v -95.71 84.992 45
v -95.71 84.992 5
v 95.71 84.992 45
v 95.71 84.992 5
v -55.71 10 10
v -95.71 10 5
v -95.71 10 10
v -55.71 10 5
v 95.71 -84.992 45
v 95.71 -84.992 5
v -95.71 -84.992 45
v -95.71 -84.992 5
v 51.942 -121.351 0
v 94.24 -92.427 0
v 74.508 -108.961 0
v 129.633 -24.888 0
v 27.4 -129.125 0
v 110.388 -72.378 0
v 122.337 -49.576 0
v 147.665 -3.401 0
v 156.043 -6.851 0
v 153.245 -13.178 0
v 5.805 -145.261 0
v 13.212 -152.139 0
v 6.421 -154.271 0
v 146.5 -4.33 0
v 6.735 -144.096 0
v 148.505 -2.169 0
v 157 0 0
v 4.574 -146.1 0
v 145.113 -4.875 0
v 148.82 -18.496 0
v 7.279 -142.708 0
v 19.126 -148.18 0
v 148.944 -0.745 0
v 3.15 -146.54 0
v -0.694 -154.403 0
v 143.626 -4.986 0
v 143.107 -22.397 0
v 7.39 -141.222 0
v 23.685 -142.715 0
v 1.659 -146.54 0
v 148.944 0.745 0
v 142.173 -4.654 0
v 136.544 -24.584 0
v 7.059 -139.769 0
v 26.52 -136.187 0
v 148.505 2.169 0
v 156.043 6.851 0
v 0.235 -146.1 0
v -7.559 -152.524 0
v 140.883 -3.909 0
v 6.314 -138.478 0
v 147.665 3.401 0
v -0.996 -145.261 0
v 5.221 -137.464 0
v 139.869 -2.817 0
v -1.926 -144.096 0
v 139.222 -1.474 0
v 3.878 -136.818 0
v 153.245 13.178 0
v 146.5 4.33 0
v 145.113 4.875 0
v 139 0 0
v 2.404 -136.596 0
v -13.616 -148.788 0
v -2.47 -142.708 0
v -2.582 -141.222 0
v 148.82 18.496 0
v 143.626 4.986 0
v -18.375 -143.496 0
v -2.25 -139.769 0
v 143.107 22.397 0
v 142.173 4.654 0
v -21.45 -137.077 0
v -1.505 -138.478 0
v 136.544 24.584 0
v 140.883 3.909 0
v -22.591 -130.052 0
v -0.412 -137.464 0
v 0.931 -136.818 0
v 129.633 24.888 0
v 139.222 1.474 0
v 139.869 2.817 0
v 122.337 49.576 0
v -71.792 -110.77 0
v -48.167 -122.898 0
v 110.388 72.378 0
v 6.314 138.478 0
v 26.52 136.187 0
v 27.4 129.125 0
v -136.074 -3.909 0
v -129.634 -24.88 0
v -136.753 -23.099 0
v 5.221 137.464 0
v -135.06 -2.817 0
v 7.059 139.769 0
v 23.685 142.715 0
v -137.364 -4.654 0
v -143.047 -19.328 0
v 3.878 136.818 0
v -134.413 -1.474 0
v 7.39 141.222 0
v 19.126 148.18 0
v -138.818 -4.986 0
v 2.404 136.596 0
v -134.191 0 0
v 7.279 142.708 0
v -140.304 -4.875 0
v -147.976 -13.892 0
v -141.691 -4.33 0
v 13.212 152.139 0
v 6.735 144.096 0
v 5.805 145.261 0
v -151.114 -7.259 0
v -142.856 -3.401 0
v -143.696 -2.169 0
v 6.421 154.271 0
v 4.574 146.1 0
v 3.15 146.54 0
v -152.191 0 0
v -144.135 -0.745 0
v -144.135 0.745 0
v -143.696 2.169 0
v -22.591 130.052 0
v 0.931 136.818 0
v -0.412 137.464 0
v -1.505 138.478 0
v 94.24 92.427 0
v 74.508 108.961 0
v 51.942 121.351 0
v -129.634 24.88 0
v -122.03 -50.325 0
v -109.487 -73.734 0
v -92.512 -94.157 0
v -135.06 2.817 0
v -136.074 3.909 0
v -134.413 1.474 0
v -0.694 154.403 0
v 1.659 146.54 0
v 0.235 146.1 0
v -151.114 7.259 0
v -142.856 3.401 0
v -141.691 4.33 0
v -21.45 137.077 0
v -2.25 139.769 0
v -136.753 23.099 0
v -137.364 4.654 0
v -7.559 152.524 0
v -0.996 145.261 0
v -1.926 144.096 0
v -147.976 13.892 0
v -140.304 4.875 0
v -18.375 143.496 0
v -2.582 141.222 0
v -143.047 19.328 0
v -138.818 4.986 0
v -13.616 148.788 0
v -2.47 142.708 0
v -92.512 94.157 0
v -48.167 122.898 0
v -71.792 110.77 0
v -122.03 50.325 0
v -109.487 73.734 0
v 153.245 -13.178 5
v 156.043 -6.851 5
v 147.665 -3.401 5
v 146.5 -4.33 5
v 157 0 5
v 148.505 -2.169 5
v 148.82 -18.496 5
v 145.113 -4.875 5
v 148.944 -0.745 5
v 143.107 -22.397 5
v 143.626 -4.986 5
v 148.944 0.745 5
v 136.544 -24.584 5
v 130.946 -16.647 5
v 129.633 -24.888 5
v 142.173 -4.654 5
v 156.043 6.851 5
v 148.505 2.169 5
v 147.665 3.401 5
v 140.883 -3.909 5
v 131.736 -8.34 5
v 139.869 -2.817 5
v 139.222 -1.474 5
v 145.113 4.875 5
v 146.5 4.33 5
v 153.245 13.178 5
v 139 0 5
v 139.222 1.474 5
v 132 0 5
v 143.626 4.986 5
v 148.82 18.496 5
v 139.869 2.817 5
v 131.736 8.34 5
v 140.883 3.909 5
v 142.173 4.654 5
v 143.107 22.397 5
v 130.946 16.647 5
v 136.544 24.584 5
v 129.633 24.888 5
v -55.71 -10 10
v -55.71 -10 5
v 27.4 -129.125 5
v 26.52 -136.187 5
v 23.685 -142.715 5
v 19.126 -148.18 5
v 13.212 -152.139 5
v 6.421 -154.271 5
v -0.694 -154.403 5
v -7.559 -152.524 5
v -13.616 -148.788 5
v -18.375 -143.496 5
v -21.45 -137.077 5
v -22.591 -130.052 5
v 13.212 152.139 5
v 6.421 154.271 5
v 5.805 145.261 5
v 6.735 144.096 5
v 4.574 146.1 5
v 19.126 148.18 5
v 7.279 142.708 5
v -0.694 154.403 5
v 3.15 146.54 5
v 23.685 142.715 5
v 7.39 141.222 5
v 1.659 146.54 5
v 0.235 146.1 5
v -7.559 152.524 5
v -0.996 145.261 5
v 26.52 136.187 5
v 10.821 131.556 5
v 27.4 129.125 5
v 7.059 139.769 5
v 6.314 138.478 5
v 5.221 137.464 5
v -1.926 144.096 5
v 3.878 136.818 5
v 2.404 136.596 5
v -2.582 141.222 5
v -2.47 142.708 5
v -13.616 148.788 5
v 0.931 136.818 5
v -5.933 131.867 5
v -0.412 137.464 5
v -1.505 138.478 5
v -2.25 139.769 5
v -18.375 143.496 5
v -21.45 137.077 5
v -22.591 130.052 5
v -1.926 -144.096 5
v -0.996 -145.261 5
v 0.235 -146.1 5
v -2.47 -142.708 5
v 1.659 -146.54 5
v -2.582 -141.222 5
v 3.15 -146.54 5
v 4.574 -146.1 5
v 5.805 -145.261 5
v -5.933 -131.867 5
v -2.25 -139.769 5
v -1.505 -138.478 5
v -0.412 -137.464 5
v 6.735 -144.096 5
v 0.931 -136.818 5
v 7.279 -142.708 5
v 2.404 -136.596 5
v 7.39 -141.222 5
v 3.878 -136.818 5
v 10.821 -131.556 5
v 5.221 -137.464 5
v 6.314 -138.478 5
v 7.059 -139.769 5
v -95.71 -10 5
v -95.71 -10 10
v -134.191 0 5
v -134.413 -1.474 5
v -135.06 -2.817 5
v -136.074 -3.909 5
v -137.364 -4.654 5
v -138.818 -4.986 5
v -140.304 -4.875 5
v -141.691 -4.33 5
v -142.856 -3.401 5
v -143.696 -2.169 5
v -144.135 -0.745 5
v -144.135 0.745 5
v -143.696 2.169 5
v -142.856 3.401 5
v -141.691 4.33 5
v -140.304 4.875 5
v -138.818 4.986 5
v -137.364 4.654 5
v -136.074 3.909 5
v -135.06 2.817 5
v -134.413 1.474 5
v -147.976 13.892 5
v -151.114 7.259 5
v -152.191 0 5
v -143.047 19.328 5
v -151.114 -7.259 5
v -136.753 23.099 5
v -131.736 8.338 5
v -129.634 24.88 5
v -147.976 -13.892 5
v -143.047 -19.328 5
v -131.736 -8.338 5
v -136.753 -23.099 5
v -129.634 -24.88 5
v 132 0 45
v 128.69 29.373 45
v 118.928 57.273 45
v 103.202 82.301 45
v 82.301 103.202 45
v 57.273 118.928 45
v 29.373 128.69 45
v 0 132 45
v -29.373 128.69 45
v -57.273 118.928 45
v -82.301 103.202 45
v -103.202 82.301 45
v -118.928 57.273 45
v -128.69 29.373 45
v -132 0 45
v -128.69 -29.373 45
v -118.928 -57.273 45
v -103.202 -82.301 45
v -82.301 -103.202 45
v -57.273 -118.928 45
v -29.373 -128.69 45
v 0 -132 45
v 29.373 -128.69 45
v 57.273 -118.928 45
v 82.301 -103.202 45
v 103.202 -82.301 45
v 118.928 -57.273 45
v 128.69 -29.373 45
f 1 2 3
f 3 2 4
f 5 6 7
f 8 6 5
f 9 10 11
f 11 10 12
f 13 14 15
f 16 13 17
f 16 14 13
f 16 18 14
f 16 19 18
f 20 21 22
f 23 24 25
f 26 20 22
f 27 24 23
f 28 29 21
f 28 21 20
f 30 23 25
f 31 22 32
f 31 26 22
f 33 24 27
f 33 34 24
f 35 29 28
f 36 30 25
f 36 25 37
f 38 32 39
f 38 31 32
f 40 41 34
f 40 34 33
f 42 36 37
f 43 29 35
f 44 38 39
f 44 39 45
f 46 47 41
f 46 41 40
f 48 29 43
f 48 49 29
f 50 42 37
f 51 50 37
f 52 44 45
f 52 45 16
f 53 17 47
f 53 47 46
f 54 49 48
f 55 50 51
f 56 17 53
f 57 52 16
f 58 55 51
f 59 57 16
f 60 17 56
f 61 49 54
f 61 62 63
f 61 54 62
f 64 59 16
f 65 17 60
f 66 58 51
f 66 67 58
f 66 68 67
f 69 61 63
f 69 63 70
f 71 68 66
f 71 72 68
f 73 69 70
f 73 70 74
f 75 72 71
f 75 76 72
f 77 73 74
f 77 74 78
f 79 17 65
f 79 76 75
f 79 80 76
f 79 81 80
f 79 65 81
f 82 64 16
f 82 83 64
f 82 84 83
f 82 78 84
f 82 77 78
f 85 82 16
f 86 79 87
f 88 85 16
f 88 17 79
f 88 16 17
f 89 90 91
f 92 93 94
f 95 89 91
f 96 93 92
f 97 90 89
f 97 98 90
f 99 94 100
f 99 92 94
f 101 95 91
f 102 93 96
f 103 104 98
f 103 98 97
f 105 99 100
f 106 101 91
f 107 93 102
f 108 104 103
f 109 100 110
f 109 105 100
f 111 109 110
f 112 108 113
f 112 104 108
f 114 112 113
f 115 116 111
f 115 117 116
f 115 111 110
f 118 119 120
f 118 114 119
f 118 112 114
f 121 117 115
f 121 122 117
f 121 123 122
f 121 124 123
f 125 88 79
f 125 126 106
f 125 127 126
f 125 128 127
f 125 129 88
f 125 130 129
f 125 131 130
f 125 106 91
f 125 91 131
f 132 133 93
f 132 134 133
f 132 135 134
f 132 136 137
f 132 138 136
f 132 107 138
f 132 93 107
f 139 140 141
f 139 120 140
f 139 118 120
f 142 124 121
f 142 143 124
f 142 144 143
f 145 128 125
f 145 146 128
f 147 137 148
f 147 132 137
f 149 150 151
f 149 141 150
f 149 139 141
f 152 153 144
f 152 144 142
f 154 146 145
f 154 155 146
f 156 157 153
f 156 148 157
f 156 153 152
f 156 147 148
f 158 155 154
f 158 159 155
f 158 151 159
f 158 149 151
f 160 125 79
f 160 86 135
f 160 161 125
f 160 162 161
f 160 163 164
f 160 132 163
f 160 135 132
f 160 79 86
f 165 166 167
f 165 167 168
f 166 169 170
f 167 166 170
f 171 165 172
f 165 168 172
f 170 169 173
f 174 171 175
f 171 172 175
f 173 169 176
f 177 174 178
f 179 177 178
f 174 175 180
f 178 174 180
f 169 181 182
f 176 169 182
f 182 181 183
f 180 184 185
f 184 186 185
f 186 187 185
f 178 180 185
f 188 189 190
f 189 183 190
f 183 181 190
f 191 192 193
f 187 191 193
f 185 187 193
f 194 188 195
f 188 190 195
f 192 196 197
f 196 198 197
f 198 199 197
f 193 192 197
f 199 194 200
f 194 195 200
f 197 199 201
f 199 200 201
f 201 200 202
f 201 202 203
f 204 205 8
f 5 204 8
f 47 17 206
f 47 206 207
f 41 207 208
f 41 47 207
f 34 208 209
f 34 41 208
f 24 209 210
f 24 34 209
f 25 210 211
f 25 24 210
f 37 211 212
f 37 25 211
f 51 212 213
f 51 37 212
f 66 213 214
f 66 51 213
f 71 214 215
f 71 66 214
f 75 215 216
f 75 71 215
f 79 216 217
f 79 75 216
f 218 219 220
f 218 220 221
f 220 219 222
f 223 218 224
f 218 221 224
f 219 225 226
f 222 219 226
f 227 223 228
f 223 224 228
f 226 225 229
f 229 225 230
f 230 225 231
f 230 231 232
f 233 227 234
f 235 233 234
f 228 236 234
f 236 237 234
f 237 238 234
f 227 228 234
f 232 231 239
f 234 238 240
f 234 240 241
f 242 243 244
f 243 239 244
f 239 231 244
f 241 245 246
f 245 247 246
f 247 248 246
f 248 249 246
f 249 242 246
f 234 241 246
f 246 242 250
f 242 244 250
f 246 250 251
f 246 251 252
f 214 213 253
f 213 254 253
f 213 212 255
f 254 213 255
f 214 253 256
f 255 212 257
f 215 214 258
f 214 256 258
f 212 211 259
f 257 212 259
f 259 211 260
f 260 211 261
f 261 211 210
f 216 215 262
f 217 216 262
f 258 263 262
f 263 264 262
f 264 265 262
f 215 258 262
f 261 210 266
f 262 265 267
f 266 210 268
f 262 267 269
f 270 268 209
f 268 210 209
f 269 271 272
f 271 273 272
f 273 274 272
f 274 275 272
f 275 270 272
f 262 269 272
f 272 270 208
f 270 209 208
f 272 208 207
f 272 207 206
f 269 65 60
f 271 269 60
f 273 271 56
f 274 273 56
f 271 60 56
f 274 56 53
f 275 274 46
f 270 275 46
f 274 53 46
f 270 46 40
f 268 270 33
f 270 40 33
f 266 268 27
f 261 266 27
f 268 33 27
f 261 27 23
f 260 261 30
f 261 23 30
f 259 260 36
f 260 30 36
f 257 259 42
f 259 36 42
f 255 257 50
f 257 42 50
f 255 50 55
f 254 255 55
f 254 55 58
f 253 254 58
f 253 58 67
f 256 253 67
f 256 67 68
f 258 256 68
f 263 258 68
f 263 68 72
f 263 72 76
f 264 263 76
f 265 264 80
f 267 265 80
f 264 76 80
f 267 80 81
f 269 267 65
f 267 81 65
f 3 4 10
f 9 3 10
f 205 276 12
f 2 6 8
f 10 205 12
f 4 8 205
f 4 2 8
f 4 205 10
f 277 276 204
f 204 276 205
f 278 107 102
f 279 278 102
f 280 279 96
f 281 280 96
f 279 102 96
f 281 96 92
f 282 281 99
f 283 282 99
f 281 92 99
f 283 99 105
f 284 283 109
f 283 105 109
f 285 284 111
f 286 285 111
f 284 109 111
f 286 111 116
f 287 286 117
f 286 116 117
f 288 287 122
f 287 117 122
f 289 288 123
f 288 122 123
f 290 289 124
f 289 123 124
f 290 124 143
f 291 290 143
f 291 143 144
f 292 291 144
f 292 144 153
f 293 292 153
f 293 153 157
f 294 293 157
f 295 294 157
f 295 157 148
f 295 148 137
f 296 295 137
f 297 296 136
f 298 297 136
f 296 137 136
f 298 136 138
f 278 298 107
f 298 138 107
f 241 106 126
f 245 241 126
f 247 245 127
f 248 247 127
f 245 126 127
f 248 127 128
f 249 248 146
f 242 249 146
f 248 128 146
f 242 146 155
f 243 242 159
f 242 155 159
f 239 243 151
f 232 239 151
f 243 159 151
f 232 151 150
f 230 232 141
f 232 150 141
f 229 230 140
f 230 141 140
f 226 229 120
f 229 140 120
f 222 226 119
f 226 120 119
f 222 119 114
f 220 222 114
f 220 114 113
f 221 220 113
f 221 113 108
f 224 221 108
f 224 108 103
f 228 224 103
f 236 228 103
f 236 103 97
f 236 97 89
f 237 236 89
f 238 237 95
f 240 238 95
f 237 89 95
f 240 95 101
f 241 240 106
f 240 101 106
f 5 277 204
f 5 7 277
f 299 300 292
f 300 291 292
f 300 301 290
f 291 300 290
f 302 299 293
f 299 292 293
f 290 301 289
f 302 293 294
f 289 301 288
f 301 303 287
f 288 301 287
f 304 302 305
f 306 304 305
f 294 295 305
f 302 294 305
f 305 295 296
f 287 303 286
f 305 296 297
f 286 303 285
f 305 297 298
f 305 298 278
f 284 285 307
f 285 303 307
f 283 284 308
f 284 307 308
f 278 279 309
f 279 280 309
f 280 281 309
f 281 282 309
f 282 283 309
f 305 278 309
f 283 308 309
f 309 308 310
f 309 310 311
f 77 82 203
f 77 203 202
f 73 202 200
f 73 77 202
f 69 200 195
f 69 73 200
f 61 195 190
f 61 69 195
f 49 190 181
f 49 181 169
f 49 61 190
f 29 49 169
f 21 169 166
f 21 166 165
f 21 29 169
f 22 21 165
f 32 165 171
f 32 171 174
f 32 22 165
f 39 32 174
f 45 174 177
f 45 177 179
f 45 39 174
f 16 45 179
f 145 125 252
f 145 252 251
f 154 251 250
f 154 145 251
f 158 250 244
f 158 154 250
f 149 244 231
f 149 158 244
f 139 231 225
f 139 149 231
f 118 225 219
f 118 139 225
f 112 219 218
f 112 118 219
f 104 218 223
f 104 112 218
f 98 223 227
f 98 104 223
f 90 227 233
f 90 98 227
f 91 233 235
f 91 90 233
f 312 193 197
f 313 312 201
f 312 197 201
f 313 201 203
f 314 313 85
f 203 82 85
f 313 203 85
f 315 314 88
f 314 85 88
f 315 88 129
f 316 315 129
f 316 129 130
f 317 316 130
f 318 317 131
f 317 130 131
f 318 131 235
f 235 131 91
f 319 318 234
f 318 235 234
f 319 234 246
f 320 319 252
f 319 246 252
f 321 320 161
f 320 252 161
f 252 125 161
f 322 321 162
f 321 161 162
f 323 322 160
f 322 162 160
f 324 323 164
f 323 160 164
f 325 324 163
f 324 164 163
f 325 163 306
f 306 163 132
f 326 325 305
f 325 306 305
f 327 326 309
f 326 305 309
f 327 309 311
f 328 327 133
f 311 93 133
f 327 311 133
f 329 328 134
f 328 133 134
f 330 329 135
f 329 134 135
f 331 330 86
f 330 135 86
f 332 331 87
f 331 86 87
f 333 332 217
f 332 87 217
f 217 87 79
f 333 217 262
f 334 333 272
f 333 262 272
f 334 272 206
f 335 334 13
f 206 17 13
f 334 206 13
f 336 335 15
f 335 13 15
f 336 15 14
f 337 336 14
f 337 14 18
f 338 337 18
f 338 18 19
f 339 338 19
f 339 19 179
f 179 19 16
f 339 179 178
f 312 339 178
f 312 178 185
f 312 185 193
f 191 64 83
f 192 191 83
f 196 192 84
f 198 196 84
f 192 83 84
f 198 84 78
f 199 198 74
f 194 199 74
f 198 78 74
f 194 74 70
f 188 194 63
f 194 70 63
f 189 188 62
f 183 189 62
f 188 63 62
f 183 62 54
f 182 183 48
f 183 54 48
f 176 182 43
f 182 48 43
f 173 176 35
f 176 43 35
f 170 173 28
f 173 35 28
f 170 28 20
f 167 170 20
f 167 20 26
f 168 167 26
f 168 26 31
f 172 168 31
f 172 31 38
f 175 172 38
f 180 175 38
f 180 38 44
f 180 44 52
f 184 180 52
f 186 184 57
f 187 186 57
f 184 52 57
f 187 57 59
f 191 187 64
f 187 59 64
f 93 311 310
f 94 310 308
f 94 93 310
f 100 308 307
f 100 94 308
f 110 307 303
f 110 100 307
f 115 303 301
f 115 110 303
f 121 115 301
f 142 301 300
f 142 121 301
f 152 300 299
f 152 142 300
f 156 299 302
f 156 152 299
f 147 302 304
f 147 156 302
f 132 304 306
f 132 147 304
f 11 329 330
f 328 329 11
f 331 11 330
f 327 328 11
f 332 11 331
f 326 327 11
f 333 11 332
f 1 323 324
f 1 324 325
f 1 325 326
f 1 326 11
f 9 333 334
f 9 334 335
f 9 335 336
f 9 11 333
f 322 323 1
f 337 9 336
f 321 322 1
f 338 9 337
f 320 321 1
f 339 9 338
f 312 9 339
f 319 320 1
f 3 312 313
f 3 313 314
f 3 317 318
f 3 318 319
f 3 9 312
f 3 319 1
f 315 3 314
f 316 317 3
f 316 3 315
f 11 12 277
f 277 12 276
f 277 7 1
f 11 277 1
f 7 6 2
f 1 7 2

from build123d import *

# Parameters (mm, degrees)
SKETCH1_R           = 132
BOSS_EXTRUDE1_DEPTH = 5
SKETCH2_R           = 132
SKETCH2_R_2         = 128
BOSS_EXTRUDE2_DEPTH = 40
BOSS_EXTRUDE3_DEPTH = 40
SKETCH6_W           = 40
SKETCH6_H           = 20
BOSS_EXTRUDE5_DEPTH = 5
SKETCH7_W           = 40
SKETCH7_H           = 20
CUT_EXTRUDE1_DEPTH  = 5
SKETCH8_W           = 40
SKETCH8_H           = 10
BOSS_EXTRUDE7_DEPTH = 5
SKETCH9_R           = 5
BOSS_EXTRUDE8_DEPTH = 5
CIRPATTERN1_COUNT   = 4


with BuildPart() as part:
    # Sketch1 → Boss-Extrude1 (new body)
    with BuildSketch(Plane.XY):
        Circle(SKETCH1_R)
    extrude(amount=BOSS_EXTRUDE1_DEPTH)

    # Sketch2 → Boss-Extrude2 (add)
    with BuildSketch(Plane.XY.offset(5)):
        Circle(SKETCH2_R)
        Circle(SKETCH2_R_2, mode=Mode.SUBTRACT)
    extrude(amount=BOSS_EXTRUDE2_DEPTH)

    # Sketch3 → Boss-Extrude3 (add)
    with BuildSketch(Plane.XY.offset(5)):
        with BuildLine():
            ThreePointArc((95.710026061, 84.99171084), (0, 128), (-95.710026061, 84.99171084))
            Line((-95.710026061, 84.99171084), (95.710026061, 84.99171084))
        make_face()
        with BuildLine():
            Line((95.710026061, 84.99171084), (95.710026061, -84.99171084))
            ThreePointArc((95.710026061, -84.99171084), (119.655512484, -45.45941412), (128, 0))
            ThreePointArc((128, 0), (119.655512484, 45.45941412), (95.710026061, 84.99171084))
        make_face()
        with BuildLine():
            Line((95.710026061, -84.99171084), (-95.710026061, -84.99171084))
            ThreePointArc((-95.710026061, -84.99171084), (0, -128), (95.710026061, -84.99171084))
        make_face()
        with BuildLine():
            ThreePointArc((-95.710026061, 84.99171084), (-128, 0), (-95.710026061, -84.99171084))
            Line((-95.710026061, -84.99171084), (-95.710026061, 84.99171084))
        make_face()
    extrude(amount=BOSS_EXTRUDE3_DEPTH)

    # Sketch6 → Boss-Extrude5 (add)
    with BuildSketch(Plane.XY.offset(5)):
        with Locations((-50, 0)):
            Rectangle(SKETCH6_W, SKETCH6_H)
    extrude(amount=BOSS_EXTRUDE5_DEPTH)

    # Sketch7 → Cut-Extrude1 (cut)
    with BuildSketch(Plane.XY.offset(10)):
        with Locations((-50, 0)):
            Rectangle(SKETCH7_W, SKETCH7_H)
    extrude(amount=-CUT_EXTRUDE1_DEPTH, mode=Mode.SUBTRACT)

    # Sketch8 → Boss-Extrude7 (add)
    with BuildSketch(Plane.XY.offset(5)):
        with Locations((-75.710026061, -5)):
            Rectangle(SKETCH8_W, SKETCH8_H)
        with Locations((-75.710026061, 5)):
            Rectangle(SKETCH8_W, SKETCH8_H)
    extrude(amount=BOSS_EXTRUDE7_DEPTH)

    # Sketch9 → Boss-Extrude8 (add)
    with BuildSketch(Plane(origin=(0, 0, 0), x_dir=(-1, 0, 0), z_dir=(0, 0, -1))):
        with BuildLine():
            ThreePointArc((-129.632575758, -24.887653615), (-132, 0), (-129.632575758, 24.887653615))
            ThreePointArc((-129.632575758, 24.887653615), (-157, 0), (-129.632575758, -24.887653615))
        make_face()
        with Locations((-144, 0)):
            Circle(SKETCH9_R, mode=Mode.SUBTRACT)
    boss_extrude8 = extrude(amount=-BOSS_EXTRUDE8_DEPTH)

    # CirPattern1: Boss-Extrude8 ×4 about axis
    cirpattern1_axis = Axis((2.404422144, 0, 0), (0, 0, 1))
    for i in range(1, CIRPATTERN1_COUNT):
        add(boss_extrude8.rotate(cirpattern1_axis, i * 360 / CIRPATTERN1_COUNT))


solid = part.part
